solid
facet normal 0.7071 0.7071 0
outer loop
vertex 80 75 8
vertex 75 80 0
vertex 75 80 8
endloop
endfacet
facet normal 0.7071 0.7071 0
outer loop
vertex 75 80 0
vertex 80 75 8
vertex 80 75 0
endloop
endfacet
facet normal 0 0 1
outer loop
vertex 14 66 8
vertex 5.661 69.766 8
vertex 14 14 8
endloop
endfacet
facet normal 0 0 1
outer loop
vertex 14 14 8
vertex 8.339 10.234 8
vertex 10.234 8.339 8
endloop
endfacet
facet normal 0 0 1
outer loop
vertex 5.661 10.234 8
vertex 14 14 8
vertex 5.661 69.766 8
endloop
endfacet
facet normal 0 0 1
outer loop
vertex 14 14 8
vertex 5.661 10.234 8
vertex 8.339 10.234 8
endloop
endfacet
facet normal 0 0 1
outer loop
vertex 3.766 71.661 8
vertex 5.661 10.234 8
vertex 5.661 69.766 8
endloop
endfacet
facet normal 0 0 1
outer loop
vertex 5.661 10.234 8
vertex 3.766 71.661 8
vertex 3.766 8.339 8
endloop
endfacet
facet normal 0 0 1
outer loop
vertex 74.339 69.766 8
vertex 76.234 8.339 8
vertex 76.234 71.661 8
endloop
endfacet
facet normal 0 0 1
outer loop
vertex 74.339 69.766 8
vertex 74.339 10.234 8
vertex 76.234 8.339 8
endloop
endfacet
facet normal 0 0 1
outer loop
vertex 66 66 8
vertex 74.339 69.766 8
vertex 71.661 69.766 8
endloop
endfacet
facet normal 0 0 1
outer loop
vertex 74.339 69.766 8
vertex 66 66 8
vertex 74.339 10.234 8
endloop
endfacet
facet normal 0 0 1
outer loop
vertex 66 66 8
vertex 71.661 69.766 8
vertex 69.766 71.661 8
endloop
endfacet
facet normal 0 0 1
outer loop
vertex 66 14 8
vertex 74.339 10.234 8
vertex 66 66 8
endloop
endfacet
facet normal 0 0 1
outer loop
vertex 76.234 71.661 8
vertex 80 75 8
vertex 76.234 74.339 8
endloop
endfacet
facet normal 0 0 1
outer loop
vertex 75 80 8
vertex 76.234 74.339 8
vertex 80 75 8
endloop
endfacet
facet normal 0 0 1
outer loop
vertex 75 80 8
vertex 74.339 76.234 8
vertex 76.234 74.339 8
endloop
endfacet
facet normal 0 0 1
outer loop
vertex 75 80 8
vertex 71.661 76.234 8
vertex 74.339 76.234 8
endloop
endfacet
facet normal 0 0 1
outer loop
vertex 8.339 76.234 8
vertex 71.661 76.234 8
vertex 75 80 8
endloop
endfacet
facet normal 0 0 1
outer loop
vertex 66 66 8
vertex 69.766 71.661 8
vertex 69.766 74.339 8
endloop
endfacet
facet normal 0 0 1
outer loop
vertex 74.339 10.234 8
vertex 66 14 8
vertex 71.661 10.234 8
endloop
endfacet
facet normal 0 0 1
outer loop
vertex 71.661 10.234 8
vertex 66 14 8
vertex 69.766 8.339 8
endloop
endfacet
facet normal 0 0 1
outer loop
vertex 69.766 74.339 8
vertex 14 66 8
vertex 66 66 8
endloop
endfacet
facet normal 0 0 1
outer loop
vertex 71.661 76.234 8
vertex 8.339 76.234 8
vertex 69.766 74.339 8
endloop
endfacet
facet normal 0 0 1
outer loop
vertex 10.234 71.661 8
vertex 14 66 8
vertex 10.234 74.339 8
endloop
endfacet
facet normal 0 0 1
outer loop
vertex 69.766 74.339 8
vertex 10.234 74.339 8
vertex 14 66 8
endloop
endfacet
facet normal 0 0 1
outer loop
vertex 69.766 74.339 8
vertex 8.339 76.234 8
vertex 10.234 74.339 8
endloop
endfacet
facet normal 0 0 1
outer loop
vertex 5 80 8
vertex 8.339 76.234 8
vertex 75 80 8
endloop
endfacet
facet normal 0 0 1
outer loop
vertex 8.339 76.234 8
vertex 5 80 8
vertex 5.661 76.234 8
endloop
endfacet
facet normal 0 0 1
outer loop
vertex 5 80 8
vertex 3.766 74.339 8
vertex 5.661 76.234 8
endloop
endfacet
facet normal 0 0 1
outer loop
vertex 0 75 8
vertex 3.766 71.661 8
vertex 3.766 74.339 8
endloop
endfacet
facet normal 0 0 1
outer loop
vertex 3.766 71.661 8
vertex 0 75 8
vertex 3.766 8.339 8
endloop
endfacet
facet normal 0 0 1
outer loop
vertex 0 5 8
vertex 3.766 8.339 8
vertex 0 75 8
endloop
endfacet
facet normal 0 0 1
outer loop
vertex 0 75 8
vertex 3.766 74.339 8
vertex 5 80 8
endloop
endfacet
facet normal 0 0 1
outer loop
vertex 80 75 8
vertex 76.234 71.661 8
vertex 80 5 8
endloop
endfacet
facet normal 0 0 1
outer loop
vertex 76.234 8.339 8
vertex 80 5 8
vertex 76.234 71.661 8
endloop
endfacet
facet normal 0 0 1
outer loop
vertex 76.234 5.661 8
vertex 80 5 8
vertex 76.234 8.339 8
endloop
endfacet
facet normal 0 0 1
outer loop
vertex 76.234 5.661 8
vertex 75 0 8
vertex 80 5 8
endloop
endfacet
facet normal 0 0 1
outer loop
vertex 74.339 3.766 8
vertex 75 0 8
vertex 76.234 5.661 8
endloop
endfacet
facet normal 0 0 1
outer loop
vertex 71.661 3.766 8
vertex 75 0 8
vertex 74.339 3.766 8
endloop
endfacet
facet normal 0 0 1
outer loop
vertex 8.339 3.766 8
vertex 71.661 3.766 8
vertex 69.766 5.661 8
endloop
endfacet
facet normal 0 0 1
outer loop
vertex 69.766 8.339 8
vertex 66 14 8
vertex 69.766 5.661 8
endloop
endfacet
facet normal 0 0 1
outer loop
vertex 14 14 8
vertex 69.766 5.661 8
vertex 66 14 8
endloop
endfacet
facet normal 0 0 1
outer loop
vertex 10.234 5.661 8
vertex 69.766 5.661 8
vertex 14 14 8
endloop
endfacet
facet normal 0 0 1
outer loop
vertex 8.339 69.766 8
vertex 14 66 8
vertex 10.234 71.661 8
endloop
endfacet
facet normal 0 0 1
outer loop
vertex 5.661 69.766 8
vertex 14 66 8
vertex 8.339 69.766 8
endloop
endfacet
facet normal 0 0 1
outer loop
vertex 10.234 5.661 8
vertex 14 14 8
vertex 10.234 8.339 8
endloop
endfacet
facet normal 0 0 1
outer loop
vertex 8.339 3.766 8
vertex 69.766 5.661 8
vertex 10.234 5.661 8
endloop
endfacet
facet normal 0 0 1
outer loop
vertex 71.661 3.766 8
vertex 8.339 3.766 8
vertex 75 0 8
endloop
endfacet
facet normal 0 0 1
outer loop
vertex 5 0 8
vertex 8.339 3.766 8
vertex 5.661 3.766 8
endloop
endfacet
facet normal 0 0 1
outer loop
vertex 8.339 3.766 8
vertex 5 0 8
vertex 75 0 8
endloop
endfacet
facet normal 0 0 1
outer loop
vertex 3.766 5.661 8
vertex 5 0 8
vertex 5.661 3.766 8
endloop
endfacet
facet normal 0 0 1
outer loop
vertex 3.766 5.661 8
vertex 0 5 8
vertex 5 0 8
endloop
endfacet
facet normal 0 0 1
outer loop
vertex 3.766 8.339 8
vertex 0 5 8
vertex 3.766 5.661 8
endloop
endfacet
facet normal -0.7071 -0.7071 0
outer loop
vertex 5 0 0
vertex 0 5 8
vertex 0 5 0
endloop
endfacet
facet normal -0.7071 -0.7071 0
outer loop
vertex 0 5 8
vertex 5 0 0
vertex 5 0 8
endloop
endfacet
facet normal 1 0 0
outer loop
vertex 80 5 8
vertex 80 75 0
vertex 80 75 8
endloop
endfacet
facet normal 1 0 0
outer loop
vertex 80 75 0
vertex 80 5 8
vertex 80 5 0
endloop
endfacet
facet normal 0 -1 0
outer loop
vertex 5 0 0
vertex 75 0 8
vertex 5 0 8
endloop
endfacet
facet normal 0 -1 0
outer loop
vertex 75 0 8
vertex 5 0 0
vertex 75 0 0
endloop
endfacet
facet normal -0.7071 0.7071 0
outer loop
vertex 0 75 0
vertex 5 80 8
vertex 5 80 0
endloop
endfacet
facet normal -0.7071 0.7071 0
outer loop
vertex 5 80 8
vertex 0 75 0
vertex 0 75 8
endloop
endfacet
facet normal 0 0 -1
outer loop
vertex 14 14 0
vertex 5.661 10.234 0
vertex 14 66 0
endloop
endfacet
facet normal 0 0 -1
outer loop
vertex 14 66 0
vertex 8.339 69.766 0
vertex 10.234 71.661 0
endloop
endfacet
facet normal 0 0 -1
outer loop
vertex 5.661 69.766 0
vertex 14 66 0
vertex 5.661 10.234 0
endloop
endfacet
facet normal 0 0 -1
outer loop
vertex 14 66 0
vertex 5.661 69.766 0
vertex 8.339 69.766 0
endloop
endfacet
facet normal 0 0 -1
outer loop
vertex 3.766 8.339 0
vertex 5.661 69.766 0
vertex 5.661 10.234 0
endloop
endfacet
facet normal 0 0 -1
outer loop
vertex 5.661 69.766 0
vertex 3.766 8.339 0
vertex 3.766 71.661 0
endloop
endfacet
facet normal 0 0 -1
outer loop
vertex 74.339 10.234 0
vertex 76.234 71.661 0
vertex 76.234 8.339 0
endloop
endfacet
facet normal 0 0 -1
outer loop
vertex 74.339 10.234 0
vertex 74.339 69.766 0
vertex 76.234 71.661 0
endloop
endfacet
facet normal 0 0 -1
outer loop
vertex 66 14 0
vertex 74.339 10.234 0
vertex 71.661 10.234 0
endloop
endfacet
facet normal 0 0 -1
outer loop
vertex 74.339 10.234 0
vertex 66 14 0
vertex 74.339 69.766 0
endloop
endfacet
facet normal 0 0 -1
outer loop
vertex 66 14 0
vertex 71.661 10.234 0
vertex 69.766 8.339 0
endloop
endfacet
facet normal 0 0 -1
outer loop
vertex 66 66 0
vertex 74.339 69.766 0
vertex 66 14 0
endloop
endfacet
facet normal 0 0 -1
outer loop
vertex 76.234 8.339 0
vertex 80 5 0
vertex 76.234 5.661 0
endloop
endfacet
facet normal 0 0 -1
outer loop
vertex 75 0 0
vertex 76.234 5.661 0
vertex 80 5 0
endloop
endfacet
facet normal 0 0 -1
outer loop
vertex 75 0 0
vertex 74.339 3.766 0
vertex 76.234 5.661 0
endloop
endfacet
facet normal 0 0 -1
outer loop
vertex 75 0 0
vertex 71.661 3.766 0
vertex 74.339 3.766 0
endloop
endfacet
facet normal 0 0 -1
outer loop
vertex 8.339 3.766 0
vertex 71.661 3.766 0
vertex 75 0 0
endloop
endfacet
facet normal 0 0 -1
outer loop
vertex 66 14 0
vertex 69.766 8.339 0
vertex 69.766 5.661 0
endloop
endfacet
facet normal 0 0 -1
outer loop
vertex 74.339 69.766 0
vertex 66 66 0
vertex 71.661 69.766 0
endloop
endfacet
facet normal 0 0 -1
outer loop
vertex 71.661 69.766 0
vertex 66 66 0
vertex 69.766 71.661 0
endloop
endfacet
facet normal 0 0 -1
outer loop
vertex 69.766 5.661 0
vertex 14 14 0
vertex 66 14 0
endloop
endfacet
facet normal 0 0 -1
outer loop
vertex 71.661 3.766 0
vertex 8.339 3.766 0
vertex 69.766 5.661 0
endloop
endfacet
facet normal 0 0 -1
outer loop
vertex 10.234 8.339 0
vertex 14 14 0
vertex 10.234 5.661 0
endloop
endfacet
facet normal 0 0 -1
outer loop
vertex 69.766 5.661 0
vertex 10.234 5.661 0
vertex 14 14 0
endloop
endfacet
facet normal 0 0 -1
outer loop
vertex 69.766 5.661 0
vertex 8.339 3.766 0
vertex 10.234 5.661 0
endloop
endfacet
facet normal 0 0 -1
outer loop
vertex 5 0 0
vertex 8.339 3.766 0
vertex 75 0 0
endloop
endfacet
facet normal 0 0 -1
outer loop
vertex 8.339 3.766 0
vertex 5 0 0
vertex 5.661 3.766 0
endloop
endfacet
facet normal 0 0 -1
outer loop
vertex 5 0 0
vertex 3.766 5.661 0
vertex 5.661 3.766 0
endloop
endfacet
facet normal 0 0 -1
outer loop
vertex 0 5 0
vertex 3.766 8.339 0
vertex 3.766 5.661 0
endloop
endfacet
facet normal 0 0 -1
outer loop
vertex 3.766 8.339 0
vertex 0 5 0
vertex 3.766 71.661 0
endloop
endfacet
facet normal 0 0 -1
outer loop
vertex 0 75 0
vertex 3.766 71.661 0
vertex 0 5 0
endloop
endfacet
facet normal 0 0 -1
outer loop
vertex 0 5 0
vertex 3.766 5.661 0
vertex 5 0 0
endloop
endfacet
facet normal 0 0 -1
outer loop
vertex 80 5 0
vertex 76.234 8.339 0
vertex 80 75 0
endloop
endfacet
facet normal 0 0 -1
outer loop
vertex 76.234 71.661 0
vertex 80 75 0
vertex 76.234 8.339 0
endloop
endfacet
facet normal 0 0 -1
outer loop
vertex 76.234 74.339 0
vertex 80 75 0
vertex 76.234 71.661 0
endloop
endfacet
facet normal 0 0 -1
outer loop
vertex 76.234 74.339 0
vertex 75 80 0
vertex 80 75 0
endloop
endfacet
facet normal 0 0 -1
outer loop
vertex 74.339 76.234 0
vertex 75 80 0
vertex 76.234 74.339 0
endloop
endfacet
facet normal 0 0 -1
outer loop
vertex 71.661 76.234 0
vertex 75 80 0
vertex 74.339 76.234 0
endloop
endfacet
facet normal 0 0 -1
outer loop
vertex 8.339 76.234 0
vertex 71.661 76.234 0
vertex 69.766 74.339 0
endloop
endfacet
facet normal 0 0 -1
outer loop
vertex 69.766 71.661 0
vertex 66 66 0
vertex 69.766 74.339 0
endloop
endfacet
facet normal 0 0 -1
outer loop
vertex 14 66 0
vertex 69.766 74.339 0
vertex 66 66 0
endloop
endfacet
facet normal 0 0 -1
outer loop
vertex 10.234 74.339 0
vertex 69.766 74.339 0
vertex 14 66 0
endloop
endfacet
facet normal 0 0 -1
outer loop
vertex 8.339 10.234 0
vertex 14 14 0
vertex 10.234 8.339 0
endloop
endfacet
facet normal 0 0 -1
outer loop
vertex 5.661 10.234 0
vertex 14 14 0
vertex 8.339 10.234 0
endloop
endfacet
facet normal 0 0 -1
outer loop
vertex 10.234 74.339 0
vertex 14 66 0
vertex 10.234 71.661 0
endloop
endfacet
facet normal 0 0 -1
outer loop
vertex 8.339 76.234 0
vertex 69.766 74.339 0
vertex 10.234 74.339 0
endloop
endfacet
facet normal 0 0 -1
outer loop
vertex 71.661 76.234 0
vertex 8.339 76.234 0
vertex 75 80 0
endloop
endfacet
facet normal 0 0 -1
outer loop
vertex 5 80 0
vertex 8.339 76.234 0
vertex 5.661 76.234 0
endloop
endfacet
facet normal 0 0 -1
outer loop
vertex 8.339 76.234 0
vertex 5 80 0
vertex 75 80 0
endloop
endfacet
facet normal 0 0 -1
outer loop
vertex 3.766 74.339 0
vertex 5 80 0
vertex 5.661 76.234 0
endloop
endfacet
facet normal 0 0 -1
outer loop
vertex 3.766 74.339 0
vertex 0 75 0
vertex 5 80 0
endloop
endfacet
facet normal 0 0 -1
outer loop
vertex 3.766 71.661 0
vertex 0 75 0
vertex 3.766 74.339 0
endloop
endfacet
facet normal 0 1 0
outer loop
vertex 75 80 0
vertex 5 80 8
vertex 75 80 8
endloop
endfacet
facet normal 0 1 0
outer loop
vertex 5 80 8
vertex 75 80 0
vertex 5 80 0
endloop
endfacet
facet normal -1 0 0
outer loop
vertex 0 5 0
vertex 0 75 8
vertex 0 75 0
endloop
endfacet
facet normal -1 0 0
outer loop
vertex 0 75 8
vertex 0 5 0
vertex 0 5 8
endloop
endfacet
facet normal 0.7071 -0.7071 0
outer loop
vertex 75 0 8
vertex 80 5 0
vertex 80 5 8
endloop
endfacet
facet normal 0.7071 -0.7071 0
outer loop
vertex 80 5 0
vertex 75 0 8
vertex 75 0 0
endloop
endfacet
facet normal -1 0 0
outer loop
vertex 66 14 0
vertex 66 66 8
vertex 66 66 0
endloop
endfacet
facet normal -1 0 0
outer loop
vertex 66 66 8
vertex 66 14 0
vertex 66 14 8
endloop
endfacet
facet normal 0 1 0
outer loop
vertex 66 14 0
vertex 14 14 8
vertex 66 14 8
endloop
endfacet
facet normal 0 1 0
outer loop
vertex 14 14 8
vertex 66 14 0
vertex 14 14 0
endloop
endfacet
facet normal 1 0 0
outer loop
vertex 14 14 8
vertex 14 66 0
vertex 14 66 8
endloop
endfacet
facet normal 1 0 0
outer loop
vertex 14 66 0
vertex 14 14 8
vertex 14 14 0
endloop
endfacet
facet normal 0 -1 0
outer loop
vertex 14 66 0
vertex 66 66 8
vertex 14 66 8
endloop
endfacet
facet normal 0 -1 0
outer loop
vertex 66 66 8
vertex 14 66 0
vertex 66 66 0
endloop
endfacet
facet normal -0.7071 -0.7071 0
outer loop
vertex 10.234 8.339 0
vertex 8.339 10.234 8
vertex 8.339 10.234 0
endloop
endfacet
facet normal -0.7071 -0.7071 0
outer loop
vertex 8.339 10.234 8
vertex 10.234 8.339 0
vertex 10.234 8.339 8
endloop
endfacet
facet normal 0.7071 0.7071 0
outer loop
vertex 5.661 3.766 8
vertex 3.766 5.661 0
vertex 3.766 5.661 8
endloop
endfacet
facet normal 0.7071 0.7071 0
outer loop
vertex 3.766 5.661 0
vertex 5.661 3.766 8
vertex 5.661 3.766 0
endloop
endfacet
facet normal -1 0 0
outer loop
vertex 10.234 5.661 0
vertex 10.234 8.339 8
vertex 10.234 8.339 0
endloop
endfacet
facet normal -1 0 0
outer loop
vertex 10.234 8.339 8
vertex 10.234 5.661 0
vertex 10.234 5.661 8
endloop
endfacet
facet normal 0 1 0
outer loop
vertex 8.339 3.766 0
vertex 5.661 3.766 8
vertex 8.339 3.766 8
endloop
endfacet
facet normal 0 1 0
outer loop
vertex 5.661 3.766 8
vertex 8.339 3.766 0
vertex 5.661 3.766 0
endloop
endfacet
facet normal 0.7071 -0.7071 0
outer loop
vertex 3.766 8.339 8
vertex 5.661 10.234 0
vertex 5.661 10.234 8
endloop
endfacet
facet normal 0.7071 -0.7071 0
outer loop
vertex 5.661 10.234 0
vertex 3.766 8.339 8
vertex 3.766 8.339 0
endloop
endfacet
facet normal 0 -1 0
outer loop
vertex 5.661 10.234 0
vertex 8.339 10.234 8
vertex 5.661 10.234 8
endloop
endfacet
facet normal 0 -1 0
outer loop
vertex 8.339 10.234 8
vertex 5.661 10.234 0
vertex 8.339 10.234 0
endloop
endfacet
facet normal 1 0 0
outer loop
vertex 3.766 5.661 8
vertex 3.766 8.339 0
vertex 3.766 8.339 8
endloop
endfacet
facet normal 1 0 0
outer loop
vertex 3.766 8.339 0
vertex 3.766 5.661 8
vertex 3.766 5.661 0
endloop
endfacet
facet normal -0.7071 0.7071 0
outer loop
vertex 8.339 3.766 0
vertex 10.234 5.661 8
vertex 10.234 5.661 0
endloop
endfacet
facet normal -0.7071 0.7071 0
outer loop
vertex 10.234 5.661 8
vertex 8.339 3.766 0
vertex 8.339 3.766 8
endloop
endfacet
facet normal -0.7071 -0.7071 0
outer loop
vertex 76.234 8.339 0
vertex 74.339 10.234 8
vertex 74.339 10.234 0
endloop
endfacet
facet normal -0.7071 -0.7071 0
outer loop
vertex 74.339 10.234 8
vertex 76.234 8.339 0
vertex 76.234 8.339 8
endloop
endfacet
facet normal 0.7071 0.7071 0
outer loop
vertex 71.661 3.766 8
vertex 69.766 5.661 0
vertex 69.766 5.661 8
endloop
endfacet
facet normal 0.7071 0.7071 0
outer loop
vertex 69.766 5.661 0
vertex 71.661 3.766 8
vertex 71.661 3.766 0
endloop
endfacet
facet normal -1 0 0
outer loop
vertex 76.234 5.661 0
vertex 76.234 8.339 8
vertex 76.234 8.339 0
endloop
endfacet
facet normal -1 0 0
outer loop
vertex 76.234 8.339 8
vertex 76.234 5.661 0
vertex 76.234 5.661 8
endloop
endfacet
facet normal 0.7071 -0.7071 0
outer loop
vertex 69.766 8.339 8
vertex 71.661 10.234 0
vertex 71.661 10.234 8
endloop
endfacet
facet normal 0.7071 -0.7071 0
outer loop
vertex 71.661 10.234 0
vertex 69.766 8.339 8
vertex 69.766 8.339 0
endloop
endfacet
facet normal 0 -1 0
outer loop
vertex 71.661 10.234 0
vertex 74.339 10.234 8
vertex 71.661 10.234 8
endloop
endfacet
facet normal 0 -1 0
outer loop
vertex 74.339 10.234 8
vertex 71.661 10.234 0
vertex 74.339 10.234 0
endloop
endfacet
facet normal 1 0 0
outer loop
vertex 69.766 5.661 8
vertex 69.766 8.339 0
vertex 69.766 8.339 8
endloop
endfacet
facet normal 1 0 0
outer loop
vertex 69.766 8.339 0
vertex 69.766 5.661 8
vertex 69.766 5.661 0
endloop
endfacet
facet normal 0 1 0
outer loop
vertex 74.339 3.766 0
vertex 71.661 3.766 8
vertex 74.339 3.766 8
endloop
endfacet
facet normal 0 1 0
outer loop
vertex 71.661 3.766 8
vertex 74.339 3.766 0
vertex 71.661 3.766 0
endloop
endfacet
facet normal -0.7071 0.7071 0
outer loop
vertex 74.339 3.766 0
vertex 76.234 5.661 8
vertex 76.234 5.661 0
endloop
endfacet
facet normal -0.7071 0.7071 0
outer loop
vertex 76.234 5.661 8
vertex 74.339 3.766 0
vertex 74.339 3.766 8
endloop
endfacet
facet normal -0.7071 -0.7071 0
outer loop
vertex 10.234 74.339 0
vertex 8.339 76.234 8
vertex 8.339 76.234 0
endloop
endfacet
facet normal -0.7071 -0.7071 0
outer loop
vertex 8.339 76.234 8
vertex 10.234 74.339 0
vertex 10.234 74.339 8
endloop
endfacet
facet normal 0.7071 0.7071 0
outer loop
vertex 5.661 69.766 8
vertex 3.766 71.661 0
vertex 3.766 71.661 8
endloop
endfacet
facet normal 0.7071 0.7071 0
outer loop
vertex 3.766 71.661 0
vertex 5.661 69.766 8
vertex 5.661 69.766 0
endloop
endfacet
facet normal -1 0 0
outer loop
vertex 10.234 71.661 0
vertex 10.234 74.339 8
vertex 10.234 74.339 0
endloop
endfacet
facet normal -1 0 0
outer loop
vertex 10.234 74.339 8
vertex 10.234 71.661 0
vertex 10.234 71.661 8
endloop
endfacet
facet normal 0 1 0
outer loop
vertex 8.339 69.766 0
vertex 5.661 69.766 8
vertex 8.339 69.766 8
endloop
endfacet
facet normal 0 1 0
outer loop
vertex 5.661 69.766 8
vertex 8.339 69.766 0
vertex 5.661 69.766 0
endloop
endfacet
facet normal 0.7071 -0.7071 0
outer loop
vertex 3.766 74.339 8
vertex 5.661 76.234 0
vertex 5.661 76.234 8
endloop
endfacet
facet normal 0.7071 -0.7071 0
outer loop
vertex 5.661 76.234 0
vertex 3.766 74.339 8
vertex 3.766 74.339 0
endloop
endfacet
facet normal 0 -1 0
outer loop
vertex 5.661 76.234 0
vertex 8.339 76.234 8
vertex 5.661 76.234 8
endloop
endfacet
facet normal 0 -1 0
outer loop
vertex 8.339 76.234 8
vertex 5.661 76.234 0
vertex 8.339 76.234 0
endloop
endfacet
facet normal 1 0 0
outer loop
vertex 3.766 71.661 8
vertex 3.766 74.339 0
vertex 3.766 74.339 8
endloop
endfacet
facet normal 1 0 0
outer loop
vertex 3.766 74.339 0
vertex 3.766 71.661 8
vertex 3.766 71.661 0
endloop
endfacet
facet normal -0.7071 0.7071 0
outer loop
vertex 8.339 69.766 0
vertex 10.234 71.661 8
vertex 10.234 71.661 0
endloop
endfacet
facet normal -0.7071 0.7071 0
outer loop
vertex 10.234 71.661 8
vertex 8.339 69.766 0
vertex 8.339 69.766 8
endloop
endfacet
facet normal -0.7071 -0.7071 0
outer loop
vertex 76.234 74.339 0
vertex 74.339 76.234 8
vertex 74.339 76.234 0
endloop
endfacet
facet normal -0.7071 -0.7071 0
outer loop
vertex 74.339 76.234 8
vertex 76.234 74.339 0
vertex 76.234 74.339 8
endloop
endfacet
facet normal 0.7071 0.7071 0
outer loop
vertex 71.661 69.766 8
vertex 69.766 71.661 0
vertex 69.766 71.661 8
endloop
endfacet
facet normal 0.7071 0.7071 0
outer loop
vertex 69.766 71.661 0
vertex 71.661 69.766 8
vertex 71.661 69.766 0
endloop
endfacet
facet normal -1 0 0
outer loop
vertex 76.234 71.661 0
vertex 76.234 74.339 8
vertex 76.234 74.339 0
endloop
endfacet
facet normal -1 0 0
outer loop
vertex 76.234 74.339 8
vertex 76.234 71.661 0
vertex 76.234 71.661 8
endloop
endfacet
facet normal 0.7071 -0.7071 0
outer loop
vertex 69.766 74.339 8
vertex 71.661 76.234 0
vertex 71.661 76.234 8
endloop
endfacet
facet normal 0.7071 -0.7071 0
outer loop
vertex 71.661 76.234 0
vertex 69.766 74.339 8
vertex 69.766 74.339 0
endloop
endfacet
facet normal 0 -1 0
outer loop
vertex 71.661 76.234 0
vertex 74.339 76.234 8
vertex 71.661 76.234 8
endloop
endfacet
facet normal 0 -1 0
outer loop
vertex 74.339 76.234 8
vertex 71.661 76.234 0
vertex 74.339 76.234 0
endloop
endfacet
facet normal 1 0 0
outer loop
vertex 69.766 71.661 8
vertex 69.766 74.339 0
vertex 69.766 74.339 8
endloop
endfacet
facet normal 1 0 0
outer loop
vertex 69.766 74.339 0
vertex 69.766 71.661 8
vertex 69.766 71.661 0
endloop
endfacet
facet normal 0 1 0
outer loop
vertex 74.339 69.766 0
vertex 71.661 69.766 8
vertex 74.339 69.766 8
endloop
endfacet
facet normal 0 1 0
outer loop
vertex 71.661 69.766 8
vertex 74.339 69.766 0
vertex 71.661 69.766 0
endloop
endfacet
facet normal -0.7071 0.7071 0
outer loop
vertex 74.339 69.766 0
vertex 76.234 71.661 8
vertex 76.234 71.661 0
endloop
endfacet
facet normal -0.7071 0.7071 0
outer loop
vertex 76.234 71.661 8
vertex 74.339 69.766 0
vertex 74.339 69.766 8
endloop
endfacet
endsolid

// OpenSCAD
$fn = 32;

// ----------------------------------------------------------------------
// Frame plate: 80 x 80 frame, 14 mm rails
// ----------------------------------------------------------------------

// --- parameters (mm) ---
plate_l = 80;             // plate length, X
plate_w = 80;             // plate width, Y
plate_t = 8;              // plate thickness, Z (extrusion height)
corner_c = 5;             // corner chamfer
frame_bar = 14;           // frame rail width
bolt_r = 3.5;             // corner bolt window radius
bolt_inset = 7;           // bolt centre inset from the edges

win_l = plate_l - 2 * frame_bar;  // window length
win_w = plate_w - 2 * frame_bar;  // window width
bolt_d = 2 * bolt_r;  // corner hole diameter

profile = [[5, 0], [75, 0], [80, 5], [80, 75], [75, 80], [5, 80], [0, 75], [0, 5]];  // primary outline, 8 points, counter clockwise
void_1 = [[14, 14], [66, 14], [66, 66], [14, 66]];  // the window, 4 points
void_2 = [[10.234, 8.339], [8.339, 10.234], [5.661, 10.234], [3.766, 8.339], [3.766, 5.661], [5.661, 3.766], [8.339, 3.766], [10.234, 5.661]];  // corner bolt window, 8 points
void_3 = [[76.234, 8.339], [74.339, 10.234], [71.661, 10.234], [69.766, 8.339], [69.766, 5.661], [71.661, 3.766], [74.339, 3.766], [76.234, 5.661]];  // corner bolt window, 8 points
void_4 = [[10.234, 74.339], [8.339, 76.234], [5.661, 76.234], [3.766, 74.339], [3.766, 71.661], [5.661, 69.766], [8.339, 69.766], [10.234, 71.661]];  // corner bolt window, 8 points
void_5 = [[76.234, 74.339], [74.339, 76.234], [71.661, 76.234], [69.766, 74.339], [69.766, 71.661], [71.661, 69.766], [74.339, 69.766], [76.234, 71.661]];  // corner bolt window, 8 points

// --- the one profile operation ---
difference() {
  linear_extrude(height = plate_t) polygon(points = profile);
  translate([0, 0, -1])
    linear_extrude(height = plate_t + 2) polygon(points = void_1);
  translate([0, 0, -1])
    linear_extrude(height = plate_t + 2) polygon(points = void_2);
  translate([0, 0, -1])
    linear_extrude(height = plate_t + 2) polygon(points = void_3);
  translate([0, 0, -1])
    linear_extrude(height = plate_t + 2) polygon(points = void_4);
  translate([0, 0, -1])
    linear_extrude(height = plate_t + 2) polygon(points = void_5);
}
